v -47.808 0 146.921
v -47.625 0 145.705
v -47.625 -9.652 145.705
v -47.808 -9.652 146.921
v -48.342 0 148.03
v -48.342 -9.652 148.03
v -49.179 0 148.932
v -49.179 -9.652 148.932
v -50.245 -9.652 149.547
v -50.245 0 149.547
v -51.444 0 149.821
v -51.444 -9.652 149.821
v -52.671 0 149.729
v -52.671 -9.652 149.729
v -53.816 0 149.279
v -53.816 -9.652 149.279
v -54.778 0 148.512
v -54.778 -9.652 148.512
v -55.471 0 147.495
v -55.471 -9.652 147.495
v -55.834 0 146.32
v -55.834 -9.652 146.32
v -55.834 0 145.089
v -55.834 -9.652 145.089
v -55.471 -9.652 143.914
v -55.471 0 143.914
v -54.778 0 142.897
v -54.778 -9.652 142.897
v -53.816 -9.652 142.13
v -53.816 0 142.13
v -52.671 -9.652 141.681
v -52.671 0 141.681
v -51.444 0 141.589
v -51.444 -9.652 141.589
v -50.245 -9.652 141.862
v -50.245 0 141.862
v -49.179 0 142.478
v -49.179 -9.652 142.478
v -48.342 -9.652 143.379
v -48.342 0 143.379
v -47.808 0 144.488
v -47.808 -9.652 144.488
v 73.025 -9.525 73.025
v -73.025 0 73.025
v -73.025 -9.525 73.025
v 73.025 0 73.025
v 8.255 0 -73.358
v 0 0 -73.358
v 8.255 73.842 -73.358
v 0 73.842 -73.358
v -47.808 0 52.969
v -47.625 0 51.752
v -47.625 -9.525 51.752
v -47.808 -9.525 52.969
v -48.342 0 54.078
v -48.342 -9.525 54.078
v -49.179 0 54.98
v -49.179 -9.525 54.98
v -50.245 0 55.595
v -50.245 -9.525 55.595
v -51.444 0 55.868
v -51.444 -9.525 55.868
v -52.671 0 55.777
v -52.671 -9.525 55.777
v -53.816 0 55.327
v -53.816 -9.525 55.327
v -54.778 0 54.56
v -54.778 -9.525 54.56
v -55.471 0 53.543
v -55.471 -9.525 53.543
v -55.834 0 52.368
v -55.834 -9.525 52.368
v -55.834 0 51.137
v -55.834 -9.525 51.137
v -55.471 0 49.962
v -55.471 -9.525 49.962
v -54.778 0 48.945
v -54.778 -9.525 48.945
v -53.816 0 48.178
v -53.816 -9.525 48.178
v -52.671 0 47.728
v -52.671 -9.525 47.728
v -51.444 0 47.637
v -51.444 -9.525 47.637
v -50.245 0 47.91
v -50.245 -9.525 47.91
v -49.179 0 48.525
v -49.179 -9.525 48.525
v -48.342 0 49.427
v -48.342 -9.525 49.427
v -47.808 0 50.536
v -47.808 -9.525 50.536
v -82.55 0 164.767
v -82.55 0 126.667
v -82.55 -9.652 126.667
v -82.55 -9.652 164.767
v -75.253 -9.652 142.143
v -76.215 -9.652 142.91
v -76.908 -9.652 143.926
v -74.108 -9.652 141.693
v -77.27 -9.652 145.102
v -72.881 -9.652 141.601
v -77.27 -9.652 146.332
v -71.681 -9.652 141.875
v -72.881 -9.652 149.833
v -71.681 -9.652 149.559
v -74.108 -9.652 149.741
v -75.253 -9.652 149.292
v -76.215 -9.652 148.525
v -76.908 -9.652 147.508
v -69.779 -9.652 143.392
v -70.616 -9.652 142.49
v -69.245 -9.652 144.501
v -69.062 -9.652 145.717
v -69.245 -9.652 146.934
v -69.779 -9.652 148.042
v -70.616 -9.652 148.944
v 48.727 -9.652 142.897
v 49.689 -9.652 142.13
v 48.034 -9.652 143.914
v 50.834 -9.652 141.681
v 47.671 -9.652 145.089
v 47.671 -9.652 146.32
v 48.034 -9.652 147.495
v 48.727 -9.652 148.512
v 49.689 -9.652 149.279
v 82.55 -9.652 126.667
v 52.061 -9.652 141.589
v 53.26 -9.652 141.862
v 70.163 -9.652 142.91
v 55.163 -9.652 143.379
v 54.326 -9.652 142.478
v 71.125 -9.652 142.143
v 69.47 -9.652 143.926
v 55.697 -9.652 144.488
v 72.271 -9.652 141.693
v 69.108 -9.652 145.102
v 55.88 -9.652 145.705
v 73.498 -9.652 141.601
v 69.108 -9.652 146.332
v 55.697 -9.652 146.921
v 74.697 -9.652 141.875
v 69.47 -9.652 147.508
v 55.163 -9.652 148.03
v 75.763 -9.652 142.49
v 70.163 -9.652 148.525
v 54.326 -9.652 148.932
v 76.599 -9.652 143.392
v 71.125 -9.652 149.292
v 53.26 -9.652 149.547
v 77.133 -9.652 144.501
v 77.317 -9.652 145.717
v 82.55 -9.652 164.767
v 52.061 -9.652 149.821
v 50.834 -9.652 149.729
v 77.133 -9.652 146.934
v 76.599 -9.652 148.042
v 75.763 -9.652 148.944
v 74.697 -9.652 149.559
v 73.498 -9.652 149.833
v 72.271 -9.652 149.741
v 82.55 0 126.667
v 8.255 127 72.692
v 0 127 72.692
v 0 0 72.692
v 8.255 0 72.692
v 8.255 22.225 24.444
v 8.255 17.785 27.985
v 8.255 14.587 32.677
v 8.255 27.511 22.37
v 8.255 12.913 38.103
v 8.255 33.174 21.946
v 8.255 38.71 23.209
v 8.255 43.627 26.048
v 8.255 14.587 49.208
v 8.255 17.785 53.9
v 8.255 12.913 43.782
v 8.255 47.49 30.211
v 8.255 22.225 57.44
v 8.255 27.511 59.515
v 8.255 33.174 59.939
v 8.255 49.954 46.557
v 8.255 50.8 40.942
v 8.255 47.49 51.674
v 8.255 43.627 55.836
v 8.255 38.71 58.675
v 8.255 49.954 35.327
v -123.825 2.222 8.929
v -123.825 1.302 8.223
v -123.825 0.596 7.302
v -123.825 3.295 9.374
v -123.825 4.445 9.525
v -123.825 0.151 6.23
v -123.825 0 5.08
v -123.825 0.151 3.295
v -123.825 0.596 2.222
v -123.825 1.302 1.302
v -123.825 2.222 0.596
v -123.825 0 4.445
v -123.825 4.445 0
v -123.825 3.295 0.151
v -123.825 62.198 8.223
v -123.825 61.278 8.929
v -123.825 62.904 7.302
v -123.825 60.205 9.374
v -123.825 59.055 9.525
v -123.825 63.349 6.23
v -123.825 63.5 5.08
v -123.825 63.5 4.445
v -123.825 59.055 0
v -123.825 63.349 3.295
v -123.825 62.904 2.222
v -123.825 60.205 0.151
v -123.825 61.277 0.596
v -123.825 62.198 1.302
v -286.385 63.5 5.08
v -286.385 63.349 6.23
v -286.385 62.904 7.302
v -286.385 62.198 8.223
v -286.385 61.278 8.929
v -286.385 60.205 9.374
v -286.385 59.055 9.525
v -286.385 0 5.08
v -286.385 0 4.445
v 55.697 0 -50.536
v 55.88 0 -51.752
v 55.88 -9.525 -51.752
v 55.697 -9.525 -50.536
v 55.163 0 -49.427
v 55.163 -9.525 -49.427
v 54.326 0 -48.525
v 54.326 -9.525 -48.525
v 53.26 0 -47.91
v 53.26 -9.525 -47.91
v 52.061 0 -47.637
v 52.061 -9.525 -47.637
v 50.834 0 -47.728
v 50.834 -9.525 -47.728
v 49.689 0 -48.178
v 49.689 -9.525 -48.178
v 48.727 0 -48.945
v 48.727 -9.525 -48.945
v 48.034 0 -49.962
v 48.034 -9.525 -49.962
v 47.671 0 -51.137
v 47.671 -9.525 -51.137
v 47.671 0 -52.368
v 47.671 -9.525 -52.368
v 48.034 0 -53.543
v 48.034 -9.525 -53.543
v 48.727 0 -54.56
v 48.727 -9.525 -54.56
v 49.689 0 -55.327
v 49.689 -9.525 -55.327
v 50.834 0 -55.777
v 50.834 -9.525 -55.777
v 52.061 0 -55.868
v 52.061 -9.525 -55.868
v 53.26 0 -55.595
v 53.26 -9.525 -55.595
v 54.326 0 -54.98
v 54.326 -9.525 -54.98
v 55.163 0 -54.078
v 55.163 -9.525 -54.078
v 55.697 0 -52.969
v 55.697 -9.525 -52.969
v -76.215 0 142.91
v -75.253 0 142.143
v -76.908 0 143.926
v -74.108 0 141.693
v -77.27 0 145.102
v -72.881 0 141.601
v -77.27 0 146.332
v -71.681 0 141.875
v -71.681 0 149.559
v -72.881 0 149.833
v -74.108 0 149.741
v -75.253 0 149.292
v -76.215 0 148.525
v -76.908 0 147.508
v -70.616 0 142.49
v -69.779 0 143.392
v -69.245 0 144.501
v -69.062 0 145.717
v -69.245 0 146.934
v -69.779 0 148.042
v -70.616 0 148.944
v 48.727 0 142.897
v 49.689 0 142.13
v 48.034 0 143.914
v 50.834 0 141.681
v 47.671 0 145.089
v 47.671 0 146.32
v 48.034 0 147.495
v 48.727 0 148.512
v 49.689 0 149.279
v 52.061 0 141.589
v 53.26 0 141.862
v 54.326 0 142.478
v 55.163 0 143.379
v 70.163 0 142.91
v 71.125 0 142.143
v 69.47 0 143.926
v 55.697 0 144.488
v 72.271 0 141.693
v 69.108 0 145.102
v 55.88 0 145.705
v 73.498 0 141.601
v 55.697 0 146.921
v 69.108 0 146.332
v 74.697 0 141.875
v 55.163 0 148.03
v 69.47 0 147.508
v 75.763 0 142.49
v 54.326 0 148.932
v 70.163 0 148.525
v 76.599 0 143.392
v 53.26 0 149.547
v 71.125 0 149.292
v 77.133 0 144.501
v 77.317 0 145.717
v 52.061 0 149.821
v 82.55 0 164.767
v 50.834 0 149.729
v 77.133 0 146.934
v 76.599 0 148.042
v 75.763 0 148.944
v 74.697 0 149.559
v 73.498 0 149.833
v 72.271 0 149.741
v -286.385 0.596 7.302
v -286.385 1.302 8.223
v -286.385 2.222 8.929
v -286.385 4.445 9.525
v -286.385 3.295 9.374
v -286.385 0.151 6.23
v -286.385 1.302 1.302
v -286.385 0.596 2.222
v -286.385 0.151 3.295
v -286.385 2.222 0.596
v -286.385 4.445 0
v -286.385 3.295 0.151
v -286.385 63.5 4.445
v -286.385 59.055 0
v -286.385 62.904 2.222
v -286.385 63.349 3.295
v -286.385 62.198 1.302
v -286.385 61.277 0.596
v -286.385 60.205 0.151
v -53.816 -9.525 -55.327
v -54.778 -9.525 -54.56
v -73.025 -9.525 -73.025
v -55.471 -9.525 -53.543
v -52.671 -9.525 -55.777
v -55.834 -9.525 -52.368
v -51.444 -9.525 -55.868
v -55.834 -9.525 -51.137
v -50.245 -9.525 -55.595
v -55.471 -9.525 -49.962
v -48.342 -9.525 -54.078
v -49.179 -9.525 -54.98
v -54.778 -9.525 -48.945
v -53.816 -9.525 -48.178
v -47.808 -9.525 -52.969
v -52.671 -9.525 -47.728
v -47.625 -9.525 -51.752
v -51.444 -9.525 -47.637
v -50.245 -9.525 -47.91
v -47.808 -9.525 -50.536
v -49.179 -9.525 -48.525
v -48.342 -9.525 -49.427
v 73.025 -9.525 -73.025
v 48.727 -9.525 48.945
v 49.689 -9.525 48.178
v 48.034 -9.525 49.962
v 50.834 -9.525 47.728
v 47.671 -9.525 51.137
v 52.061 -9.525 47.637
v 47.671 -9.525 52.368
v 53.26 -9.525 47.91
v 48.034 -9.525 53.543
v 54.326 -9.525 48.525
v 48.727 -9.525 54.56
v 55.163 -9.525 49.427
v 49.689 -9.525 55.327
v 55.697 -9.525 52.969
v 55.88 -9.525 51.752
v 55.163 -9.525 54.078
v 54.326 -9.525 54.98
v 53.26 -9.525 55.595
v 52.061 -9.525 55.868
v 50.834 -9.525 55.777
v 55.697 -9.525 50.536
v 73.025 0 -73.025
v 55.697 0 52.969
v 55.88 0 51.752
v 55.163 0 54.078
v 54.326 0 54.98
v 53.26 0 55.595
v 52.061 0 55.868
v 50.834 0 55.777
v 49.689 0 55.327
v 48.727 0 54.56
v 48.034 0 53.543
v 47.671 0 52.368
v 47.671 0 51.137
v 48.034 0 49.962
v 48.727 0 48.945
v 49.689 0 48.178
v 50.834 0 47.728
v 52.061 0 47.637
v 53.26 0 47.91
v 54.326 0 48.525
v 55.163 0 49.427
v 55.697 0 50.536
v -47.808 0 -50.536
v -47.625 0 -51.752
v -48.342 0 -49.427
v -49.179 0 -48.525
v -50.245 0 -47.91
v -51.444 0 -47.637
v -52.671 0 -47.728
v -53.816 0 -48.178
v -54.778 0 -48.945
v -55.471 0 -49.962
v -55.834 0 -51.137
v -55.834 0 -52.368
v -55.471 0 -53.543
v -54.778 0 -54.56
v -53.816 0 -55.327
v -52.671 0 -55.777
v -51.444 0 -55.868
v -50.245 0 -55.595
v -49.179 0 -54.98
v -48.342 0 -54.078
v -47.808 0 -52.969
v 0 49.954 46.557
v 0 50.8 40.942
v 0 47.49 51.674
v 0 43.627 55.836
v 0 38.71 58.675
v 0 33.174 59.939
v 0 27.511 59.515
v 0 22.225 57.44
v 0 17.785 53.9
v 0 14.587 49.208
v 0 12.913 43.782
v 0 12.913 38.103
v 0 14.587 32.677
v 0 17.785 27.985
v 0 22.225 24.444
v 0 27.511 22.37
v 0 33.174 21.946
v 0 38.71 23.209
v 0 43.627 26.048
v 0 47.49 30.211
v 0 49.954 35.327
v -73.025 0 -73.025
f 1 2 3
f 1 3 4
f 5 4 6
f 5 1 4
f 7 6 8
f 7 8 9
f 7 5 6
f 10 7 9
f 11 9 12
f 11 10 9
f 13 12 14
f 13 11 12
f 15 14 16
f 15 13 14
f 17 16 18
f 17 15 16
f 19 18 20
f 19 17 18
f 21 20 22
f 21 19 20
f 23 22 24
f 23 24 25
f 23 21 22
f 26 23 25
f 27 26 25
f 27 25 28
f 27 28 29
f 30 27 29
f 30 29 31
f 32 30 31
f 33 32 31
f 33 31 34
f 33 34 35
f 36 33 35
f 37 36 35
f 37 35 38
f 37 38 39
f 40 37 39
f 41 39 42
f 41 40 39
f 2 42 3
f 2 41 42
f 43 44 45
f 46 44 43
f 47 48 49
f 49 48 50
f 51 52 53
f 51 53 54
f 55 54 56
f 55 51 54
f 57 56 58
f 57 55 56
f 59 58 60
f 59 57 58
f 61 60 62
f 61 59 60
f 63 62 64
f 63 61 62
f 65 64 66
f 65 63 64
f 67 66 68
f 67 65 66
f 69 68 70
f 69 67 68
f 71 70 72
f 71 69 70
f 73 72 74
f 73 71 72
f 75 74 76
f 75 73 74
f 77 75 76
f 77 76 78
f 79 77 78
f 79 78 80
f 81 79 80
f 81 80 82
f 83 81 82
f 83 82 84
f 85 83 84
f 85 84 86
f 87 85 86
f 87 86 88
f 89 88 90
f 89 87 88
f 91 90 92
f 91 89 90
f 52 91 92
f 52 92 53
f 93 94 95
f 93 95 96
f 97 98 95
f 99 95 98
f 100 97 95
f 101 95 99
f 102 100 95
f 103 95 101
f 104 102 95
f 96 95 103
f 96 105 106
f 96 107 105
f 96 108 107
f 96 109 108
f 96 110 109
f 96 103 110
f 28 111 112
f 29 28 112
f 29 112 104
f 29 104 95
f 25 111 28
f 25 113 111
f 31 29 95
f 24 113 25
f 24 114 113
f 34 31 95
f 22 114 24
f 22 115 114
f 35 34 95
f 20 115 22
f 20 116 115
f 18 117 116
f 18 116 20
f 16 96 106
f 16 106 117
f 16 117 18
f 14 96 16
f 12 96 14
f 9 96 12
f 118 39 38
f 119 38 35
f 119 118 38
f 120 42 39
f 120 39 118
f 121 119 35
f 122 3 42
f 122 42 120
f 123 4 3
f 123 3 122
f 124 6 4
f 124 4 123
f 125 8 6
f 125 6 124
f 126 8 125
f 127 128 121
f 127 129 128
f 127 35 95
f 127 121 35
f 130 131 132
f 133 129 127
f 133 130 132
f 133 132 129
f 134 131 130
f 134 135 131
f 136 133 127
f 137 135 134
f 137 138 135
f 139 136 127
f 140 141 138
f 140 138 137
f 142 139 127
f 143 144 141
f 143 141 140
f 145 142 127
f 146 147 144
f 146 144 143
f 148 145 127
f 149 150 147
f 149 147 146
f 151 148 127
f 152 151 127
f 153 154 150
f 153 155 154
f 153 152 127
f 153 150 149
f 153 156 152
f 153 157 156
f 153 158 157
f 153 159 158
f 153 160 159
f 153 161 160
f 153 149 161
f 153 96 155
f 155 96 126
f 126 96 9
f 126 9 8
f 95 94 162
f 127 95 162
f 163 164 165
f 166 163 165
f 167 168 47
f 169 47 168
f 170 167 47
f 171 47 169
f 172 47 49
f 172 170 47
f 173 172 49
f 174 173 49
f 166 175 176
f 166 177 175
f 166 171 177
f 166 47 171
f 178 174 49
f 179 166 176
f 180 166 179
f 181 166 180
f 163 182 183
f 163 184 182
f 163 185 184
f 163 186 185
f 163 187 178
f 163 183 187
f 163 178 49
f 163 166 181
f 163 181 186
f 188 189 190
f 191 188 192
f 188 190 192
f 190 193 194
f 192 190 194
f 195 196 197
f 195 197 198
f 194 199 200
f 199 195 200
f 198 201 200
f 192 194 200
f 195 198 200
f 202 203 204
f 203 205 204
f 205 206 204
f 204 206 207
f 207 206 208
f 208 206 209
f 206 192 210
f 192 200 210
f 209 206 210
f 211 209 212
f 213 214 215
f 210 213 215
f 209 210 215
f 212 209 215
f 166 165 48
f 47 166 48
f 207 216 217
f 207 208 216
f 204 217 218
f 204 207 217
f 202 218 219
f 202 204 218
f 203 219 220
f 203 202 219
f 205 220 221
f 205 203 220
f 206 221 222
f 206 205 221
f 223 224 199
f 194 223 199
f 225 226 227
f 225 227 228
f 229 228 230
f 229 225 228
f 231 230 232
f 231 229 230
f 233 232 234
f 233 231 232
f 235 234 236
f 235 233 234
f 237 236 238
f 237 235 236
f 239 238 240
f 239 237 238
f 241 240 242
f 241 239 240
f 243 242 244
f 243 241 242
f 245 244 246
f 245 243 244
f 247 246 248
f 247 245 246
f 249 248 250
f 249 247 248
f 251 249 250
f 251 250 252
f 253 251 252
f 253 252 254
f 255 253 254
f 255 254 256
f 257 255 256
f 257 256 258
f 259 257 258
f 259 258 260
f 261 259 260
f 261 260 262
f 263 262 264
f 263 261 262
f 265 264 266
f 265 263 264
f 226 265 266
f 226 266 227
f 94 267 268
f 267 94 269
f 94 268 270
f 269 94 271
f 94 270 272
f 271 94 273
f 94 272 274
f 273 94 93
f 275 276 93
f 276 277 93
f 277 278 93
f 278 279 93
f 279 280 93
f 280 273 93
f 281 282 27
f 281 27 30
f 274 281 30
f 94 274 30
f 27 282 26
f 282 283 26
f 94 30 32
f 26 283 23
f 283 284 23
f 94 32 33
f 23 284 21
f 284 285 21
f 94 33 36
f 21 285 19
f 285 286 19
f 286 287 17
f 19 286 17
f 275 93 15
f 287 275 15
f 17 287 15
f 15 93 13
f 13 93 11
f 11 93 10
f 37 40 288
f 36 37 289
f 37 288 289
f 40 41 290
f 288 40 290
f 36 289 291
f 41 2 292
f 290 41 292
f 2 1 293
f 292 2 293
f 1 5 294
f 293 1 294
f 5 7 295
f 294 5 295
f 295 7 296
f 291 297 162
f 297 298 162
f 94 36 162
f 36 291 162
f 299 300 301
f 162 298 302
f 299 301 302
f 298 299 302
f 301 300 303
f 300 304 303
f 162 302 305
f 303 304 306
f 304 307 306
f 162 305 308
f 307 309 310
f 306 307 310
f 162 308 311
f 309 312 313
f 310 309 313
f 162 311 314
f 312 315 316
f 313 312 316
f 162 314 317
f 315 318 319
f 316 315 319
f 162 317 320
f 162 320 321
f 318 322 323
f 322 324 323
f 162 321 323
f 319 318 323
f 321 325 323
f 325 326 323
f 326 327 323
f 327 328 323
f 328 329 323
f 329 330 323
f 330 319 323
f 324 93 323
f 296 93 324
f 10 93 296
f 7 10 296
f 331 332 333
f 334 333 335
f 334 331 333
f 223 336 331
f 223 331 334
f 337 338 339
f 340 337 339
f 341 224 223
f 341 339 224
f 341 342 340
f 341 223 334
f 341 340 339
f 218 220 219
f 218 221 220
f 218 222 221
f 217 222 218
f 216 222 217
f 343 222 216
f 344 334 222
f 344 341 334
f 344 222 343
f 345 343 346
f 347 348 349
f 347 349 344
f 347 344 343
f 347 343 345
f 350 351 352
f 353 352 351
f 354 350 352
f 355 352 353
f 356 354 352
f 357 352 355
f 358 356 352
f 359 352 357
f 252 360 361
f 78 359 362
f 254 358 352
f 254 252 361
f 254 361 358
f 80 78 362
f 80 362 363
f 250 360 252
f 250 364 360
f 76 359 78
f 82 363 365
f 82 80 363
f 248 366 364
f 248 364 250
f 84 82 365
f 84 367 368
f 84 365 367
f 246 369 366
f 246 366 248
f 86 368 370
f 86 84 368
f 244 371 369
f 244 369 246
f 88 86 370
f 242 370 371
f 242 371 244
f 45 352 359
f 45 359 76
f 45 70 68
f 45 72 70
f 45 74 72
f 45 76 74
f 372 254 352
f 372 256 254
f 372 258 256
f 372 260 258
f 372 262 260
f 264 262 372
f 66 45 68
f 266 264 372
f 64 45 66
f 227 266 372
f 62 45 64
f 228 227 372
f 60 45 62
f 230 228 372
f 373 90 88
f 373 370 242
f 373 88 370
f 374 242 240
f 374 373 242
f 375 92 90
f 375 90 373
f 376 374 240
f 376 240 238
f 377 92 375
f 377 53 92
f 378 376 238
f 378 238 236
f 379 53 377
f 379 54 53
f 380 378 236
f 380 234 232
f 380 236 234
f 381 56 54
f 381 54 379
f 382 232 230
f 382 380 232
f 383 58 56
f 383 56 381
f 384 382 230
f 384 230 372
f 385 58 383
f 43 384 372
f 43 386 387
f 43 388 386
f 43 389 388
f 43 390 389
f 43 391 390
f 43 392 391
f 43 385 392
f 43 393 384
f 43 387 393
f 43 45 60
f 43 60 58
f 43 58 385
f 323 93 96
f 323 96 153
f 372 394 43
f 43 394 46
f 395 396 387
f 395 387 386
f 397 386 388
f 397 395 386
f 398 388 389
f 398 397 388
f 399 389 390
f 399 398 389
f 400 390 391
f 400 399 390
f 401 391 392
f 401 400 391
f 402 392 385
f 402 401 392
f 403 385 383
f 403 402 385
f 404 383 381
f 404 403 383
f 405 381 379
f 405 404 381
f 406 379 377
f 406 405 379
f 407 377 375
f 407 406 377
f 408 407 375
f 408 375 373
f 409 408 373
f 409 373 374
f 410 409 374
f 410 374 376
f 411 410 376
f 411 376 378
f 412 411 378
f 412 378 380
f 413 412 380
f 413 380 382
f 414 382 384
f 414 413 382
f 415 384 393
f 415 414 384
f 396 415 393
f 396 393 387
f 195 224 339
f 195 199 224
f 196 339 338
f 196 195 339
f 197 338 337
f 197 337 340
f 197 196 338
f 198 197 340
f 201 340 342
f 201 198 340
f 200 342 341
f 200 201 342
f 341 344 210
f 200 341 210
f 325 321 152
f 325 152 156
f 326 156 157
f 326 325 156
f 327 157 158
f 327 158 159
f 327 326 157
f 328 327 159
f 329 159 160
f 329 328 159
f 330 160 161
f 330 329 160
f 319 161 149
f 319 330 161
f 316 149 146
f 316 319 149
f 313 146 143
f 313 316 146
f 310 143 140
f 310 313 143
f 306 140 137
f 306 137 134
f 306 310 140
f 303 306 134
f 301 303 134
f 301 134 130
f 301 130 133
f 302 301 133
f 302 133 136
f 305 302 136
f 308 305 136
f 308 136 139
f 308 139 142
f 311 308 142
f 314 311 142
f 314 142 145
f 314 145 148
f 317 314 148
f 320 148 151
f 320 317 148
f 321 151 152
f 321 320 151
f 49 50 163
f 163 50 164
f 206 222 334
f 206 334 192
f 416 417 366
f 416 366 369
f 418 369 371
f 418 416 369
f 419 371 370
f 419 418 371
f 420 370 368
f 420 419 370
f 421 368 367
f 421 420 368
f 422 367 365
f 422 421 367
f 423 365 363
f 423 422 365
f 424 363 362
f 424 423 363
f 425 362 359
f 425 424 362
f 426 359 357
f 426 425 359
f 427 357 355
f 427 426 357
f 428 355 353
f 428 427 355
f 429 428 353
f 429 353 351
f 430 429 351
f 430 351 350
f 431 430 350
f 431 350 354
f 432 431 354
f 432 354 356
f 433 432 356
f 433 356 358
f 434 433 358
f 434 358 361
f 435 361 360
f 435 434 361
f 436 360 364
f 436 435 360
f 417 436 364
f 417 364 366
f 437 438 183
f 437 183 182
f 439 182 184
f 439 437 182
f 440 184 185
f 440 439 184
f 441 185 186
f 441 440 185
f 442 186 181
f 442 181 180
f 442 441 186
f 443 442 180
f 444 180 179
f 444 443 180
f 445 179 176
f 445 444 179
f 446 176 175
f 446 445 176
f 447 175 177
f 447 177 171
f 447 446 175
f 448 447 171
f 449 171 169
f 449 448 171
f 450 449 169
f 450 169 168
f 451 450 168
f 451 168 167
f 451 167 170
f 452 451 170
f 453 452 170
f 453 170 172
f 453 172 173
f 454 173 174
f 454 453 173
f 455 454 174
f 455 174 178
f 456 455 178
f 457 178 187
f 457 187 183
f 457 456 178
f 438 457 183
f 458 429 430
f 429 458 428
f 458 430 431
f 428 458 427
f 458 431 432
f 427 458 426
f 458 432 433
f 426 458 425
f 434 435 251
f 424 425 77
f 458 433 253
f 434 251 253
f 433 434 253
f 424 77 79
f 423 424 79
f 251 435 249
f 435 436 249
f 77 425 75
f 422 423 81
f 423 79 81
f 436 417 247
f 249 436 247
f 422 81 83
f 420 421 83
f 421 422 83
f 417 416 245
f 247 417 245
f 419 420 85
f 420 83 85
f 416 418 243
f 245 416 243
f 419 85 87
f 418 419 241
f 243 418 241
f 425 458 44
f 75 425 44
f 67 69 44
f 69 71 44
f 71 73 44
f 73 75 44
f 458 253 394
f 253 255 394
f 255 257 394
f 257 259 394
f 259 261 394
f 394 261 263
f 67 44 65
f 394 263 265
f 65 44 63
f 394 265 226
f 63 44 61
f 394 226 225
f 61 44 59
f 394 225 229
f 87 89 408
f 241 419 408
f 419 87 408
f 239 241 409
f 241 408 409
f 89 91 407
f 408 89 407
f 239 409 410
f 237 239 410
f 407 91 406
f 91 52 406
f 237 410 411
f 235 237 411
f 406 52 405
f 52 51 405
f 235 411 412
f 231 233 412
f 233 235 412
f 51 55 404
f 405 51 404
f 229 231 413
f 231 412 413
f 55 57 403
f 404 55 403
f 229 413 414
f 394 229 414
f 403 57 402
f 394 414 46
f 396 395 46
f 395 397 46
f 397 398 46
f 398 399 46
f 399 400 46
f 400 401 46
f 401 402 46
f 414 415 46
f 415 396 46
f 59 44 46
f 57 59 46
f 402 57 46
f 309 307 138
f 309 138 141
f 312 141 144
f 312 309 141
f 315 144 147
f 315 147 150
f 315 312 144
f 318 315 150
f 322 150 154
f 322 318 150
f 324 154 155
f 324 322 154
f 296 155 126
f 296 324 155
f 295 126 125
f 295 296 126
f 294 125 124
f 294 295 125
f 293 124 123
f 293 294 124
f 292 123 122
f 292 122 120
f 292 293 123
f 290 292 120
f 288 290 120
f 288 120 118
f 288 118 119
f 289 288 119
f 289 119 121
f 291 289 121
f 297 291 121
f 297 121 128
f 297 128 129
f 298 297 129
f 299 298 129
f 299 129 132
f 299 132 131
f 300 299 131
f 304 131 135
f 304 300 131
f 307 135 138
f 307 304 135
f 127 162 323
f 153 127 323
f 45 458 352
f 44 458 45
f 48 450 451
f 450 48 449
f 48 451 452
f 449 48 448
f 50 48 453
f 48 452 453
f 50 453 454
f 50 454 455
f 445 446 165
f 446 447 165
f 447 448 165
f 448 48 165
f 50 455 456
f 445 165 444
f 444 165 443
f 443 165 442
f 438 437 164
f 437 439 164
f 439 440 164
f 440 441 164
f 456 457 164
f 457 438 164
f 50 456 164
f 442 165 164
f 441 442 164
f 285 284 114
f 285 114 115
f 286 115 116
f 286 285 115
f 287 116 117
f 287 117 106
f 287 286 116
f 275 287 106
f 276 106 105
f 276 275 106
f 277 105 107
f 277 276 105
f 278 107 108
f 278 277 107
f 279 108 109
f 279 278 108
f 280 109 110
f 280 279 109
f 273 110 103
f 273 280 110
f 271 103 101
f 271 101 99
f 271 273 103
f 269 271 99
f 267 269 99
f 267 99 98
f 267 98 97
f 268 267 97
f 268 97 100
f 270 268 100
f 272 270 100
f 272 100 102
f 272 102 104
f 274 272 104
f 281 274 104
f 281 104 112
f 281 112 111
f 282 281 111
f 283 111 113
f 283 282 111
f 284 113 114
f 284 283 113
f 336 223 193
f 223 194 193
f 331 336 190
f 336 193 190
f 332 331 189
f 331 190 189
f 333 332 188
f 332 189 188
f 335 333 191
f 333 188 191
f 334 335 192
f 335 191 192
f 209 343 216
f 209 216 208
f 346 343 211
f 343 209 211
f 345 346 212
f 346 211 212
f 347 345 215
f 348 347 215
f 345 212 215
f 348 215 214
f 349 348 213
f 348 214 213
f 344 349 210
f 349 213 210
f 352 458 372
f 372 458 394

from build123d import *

# Parameters (mm, degrees)
F0_W     = 146.05
F0_H     = 146.05
F0_R     = 4.1275
F0_W_2   = 95.25
F0_H_2   = 95.25
F1_DEPTH = 9.525
F2_R     = 19.05
F3_DEPTH = 8.255
F4_W     = 162.56
F4_H     = 63.5
F5_DEPTH = 9.525
F6_R     = 4.445
F7_W     = 165.1
F7_H     = 38.1
F7_R     = 4.1275
F8_DEPTH = 9.652


with BuildPart() as f1:
    # F0 (on Front) → F1 (new body)
    with BuildSketch(Plane.XZ):
        Rectangle(F0_W, F0_H)
        with Locations((-51.7525, -51.7525)):
            Circle(F0_R, mode=Mode.SUBTRACT)
        with Locations((51.7525, -51.7525)):
            Circle(F0_R, mode=Mode.SUBTRACT)
        with Locations((-51.7525, 51.7525)):
            Circle(F0_R, mode=Mode.SUBTRACT)
        Rectangle(F0_W_2, F0_H_2, mode=Mode.SUBTRACT)
        with Locations((51.7525, 51.7525)):
            Circle(F0_R, mode=Mode.SUBTRACT)
        Rectangle(F0_W_2, F0_H_2)
    extrude(amount=F1_DEPTH)


with BuildPart() as f3:
    # F2 (on Right) → F3 (new body)
    with BuildSketch(Plane.YZ):
        Polygon((0, 72.692256), (0, -73.357744), (73.842147, -73.357744), (127, 72.692256), align=None)
        with Locations((31.75, 40.942256)):
            Circle(F2_R, mode=Mode.SUBTRACT)
    extrude(amount=F3_DEPTH)


with BuildPart() as f5:
    # F4 (on Top) → F5 (new body)
    with BuildSketch(Plane.XY):
        with Locations((-205.105, 31.75)):
            Rectangle(F4_W, F4_H)
    extrude(amount=F5_DEPTH)

    # F6
    f6_edges = [f5.edges().sort_by_distance(p)[0] for p in [
        (-205.105, 0, 9.525),
        (-205.105, 0, 0),
        (-205.105, 63.5, 9.525),
        (-205.105, 63.5, 0),
    ]]
    fillet(f6_edges, radius=F6_R)


with BuildPart() as f8:
    # F7 (on Front) → F8 (new body)
    with BuildSketch(Plane.XZ):
        with Locations((0, 145.717256)):
            Rectangle(F7_W, F7_H)
        with Locations((-73.189084, 145.717256)):
            Circle(F7_R, mode=Mode.SUBTRACT)
        with Locations((-51.7525, 145.704556)):
            Circle(F7_R, mode=Mode.SUBTRACT)
        with Locations((51.7525, 145.704556)):
            Circle(F7_R, mode=Mode.SUBTRACT)
        with Locations((73.189084, 145.717256)):
            Circle(F7_R, mode=Mode.SUBTRACT)
    extrude(amount=F8_DEPTH)


solid = Compound([f1.part, f3.part, f5.part, f8.part])
